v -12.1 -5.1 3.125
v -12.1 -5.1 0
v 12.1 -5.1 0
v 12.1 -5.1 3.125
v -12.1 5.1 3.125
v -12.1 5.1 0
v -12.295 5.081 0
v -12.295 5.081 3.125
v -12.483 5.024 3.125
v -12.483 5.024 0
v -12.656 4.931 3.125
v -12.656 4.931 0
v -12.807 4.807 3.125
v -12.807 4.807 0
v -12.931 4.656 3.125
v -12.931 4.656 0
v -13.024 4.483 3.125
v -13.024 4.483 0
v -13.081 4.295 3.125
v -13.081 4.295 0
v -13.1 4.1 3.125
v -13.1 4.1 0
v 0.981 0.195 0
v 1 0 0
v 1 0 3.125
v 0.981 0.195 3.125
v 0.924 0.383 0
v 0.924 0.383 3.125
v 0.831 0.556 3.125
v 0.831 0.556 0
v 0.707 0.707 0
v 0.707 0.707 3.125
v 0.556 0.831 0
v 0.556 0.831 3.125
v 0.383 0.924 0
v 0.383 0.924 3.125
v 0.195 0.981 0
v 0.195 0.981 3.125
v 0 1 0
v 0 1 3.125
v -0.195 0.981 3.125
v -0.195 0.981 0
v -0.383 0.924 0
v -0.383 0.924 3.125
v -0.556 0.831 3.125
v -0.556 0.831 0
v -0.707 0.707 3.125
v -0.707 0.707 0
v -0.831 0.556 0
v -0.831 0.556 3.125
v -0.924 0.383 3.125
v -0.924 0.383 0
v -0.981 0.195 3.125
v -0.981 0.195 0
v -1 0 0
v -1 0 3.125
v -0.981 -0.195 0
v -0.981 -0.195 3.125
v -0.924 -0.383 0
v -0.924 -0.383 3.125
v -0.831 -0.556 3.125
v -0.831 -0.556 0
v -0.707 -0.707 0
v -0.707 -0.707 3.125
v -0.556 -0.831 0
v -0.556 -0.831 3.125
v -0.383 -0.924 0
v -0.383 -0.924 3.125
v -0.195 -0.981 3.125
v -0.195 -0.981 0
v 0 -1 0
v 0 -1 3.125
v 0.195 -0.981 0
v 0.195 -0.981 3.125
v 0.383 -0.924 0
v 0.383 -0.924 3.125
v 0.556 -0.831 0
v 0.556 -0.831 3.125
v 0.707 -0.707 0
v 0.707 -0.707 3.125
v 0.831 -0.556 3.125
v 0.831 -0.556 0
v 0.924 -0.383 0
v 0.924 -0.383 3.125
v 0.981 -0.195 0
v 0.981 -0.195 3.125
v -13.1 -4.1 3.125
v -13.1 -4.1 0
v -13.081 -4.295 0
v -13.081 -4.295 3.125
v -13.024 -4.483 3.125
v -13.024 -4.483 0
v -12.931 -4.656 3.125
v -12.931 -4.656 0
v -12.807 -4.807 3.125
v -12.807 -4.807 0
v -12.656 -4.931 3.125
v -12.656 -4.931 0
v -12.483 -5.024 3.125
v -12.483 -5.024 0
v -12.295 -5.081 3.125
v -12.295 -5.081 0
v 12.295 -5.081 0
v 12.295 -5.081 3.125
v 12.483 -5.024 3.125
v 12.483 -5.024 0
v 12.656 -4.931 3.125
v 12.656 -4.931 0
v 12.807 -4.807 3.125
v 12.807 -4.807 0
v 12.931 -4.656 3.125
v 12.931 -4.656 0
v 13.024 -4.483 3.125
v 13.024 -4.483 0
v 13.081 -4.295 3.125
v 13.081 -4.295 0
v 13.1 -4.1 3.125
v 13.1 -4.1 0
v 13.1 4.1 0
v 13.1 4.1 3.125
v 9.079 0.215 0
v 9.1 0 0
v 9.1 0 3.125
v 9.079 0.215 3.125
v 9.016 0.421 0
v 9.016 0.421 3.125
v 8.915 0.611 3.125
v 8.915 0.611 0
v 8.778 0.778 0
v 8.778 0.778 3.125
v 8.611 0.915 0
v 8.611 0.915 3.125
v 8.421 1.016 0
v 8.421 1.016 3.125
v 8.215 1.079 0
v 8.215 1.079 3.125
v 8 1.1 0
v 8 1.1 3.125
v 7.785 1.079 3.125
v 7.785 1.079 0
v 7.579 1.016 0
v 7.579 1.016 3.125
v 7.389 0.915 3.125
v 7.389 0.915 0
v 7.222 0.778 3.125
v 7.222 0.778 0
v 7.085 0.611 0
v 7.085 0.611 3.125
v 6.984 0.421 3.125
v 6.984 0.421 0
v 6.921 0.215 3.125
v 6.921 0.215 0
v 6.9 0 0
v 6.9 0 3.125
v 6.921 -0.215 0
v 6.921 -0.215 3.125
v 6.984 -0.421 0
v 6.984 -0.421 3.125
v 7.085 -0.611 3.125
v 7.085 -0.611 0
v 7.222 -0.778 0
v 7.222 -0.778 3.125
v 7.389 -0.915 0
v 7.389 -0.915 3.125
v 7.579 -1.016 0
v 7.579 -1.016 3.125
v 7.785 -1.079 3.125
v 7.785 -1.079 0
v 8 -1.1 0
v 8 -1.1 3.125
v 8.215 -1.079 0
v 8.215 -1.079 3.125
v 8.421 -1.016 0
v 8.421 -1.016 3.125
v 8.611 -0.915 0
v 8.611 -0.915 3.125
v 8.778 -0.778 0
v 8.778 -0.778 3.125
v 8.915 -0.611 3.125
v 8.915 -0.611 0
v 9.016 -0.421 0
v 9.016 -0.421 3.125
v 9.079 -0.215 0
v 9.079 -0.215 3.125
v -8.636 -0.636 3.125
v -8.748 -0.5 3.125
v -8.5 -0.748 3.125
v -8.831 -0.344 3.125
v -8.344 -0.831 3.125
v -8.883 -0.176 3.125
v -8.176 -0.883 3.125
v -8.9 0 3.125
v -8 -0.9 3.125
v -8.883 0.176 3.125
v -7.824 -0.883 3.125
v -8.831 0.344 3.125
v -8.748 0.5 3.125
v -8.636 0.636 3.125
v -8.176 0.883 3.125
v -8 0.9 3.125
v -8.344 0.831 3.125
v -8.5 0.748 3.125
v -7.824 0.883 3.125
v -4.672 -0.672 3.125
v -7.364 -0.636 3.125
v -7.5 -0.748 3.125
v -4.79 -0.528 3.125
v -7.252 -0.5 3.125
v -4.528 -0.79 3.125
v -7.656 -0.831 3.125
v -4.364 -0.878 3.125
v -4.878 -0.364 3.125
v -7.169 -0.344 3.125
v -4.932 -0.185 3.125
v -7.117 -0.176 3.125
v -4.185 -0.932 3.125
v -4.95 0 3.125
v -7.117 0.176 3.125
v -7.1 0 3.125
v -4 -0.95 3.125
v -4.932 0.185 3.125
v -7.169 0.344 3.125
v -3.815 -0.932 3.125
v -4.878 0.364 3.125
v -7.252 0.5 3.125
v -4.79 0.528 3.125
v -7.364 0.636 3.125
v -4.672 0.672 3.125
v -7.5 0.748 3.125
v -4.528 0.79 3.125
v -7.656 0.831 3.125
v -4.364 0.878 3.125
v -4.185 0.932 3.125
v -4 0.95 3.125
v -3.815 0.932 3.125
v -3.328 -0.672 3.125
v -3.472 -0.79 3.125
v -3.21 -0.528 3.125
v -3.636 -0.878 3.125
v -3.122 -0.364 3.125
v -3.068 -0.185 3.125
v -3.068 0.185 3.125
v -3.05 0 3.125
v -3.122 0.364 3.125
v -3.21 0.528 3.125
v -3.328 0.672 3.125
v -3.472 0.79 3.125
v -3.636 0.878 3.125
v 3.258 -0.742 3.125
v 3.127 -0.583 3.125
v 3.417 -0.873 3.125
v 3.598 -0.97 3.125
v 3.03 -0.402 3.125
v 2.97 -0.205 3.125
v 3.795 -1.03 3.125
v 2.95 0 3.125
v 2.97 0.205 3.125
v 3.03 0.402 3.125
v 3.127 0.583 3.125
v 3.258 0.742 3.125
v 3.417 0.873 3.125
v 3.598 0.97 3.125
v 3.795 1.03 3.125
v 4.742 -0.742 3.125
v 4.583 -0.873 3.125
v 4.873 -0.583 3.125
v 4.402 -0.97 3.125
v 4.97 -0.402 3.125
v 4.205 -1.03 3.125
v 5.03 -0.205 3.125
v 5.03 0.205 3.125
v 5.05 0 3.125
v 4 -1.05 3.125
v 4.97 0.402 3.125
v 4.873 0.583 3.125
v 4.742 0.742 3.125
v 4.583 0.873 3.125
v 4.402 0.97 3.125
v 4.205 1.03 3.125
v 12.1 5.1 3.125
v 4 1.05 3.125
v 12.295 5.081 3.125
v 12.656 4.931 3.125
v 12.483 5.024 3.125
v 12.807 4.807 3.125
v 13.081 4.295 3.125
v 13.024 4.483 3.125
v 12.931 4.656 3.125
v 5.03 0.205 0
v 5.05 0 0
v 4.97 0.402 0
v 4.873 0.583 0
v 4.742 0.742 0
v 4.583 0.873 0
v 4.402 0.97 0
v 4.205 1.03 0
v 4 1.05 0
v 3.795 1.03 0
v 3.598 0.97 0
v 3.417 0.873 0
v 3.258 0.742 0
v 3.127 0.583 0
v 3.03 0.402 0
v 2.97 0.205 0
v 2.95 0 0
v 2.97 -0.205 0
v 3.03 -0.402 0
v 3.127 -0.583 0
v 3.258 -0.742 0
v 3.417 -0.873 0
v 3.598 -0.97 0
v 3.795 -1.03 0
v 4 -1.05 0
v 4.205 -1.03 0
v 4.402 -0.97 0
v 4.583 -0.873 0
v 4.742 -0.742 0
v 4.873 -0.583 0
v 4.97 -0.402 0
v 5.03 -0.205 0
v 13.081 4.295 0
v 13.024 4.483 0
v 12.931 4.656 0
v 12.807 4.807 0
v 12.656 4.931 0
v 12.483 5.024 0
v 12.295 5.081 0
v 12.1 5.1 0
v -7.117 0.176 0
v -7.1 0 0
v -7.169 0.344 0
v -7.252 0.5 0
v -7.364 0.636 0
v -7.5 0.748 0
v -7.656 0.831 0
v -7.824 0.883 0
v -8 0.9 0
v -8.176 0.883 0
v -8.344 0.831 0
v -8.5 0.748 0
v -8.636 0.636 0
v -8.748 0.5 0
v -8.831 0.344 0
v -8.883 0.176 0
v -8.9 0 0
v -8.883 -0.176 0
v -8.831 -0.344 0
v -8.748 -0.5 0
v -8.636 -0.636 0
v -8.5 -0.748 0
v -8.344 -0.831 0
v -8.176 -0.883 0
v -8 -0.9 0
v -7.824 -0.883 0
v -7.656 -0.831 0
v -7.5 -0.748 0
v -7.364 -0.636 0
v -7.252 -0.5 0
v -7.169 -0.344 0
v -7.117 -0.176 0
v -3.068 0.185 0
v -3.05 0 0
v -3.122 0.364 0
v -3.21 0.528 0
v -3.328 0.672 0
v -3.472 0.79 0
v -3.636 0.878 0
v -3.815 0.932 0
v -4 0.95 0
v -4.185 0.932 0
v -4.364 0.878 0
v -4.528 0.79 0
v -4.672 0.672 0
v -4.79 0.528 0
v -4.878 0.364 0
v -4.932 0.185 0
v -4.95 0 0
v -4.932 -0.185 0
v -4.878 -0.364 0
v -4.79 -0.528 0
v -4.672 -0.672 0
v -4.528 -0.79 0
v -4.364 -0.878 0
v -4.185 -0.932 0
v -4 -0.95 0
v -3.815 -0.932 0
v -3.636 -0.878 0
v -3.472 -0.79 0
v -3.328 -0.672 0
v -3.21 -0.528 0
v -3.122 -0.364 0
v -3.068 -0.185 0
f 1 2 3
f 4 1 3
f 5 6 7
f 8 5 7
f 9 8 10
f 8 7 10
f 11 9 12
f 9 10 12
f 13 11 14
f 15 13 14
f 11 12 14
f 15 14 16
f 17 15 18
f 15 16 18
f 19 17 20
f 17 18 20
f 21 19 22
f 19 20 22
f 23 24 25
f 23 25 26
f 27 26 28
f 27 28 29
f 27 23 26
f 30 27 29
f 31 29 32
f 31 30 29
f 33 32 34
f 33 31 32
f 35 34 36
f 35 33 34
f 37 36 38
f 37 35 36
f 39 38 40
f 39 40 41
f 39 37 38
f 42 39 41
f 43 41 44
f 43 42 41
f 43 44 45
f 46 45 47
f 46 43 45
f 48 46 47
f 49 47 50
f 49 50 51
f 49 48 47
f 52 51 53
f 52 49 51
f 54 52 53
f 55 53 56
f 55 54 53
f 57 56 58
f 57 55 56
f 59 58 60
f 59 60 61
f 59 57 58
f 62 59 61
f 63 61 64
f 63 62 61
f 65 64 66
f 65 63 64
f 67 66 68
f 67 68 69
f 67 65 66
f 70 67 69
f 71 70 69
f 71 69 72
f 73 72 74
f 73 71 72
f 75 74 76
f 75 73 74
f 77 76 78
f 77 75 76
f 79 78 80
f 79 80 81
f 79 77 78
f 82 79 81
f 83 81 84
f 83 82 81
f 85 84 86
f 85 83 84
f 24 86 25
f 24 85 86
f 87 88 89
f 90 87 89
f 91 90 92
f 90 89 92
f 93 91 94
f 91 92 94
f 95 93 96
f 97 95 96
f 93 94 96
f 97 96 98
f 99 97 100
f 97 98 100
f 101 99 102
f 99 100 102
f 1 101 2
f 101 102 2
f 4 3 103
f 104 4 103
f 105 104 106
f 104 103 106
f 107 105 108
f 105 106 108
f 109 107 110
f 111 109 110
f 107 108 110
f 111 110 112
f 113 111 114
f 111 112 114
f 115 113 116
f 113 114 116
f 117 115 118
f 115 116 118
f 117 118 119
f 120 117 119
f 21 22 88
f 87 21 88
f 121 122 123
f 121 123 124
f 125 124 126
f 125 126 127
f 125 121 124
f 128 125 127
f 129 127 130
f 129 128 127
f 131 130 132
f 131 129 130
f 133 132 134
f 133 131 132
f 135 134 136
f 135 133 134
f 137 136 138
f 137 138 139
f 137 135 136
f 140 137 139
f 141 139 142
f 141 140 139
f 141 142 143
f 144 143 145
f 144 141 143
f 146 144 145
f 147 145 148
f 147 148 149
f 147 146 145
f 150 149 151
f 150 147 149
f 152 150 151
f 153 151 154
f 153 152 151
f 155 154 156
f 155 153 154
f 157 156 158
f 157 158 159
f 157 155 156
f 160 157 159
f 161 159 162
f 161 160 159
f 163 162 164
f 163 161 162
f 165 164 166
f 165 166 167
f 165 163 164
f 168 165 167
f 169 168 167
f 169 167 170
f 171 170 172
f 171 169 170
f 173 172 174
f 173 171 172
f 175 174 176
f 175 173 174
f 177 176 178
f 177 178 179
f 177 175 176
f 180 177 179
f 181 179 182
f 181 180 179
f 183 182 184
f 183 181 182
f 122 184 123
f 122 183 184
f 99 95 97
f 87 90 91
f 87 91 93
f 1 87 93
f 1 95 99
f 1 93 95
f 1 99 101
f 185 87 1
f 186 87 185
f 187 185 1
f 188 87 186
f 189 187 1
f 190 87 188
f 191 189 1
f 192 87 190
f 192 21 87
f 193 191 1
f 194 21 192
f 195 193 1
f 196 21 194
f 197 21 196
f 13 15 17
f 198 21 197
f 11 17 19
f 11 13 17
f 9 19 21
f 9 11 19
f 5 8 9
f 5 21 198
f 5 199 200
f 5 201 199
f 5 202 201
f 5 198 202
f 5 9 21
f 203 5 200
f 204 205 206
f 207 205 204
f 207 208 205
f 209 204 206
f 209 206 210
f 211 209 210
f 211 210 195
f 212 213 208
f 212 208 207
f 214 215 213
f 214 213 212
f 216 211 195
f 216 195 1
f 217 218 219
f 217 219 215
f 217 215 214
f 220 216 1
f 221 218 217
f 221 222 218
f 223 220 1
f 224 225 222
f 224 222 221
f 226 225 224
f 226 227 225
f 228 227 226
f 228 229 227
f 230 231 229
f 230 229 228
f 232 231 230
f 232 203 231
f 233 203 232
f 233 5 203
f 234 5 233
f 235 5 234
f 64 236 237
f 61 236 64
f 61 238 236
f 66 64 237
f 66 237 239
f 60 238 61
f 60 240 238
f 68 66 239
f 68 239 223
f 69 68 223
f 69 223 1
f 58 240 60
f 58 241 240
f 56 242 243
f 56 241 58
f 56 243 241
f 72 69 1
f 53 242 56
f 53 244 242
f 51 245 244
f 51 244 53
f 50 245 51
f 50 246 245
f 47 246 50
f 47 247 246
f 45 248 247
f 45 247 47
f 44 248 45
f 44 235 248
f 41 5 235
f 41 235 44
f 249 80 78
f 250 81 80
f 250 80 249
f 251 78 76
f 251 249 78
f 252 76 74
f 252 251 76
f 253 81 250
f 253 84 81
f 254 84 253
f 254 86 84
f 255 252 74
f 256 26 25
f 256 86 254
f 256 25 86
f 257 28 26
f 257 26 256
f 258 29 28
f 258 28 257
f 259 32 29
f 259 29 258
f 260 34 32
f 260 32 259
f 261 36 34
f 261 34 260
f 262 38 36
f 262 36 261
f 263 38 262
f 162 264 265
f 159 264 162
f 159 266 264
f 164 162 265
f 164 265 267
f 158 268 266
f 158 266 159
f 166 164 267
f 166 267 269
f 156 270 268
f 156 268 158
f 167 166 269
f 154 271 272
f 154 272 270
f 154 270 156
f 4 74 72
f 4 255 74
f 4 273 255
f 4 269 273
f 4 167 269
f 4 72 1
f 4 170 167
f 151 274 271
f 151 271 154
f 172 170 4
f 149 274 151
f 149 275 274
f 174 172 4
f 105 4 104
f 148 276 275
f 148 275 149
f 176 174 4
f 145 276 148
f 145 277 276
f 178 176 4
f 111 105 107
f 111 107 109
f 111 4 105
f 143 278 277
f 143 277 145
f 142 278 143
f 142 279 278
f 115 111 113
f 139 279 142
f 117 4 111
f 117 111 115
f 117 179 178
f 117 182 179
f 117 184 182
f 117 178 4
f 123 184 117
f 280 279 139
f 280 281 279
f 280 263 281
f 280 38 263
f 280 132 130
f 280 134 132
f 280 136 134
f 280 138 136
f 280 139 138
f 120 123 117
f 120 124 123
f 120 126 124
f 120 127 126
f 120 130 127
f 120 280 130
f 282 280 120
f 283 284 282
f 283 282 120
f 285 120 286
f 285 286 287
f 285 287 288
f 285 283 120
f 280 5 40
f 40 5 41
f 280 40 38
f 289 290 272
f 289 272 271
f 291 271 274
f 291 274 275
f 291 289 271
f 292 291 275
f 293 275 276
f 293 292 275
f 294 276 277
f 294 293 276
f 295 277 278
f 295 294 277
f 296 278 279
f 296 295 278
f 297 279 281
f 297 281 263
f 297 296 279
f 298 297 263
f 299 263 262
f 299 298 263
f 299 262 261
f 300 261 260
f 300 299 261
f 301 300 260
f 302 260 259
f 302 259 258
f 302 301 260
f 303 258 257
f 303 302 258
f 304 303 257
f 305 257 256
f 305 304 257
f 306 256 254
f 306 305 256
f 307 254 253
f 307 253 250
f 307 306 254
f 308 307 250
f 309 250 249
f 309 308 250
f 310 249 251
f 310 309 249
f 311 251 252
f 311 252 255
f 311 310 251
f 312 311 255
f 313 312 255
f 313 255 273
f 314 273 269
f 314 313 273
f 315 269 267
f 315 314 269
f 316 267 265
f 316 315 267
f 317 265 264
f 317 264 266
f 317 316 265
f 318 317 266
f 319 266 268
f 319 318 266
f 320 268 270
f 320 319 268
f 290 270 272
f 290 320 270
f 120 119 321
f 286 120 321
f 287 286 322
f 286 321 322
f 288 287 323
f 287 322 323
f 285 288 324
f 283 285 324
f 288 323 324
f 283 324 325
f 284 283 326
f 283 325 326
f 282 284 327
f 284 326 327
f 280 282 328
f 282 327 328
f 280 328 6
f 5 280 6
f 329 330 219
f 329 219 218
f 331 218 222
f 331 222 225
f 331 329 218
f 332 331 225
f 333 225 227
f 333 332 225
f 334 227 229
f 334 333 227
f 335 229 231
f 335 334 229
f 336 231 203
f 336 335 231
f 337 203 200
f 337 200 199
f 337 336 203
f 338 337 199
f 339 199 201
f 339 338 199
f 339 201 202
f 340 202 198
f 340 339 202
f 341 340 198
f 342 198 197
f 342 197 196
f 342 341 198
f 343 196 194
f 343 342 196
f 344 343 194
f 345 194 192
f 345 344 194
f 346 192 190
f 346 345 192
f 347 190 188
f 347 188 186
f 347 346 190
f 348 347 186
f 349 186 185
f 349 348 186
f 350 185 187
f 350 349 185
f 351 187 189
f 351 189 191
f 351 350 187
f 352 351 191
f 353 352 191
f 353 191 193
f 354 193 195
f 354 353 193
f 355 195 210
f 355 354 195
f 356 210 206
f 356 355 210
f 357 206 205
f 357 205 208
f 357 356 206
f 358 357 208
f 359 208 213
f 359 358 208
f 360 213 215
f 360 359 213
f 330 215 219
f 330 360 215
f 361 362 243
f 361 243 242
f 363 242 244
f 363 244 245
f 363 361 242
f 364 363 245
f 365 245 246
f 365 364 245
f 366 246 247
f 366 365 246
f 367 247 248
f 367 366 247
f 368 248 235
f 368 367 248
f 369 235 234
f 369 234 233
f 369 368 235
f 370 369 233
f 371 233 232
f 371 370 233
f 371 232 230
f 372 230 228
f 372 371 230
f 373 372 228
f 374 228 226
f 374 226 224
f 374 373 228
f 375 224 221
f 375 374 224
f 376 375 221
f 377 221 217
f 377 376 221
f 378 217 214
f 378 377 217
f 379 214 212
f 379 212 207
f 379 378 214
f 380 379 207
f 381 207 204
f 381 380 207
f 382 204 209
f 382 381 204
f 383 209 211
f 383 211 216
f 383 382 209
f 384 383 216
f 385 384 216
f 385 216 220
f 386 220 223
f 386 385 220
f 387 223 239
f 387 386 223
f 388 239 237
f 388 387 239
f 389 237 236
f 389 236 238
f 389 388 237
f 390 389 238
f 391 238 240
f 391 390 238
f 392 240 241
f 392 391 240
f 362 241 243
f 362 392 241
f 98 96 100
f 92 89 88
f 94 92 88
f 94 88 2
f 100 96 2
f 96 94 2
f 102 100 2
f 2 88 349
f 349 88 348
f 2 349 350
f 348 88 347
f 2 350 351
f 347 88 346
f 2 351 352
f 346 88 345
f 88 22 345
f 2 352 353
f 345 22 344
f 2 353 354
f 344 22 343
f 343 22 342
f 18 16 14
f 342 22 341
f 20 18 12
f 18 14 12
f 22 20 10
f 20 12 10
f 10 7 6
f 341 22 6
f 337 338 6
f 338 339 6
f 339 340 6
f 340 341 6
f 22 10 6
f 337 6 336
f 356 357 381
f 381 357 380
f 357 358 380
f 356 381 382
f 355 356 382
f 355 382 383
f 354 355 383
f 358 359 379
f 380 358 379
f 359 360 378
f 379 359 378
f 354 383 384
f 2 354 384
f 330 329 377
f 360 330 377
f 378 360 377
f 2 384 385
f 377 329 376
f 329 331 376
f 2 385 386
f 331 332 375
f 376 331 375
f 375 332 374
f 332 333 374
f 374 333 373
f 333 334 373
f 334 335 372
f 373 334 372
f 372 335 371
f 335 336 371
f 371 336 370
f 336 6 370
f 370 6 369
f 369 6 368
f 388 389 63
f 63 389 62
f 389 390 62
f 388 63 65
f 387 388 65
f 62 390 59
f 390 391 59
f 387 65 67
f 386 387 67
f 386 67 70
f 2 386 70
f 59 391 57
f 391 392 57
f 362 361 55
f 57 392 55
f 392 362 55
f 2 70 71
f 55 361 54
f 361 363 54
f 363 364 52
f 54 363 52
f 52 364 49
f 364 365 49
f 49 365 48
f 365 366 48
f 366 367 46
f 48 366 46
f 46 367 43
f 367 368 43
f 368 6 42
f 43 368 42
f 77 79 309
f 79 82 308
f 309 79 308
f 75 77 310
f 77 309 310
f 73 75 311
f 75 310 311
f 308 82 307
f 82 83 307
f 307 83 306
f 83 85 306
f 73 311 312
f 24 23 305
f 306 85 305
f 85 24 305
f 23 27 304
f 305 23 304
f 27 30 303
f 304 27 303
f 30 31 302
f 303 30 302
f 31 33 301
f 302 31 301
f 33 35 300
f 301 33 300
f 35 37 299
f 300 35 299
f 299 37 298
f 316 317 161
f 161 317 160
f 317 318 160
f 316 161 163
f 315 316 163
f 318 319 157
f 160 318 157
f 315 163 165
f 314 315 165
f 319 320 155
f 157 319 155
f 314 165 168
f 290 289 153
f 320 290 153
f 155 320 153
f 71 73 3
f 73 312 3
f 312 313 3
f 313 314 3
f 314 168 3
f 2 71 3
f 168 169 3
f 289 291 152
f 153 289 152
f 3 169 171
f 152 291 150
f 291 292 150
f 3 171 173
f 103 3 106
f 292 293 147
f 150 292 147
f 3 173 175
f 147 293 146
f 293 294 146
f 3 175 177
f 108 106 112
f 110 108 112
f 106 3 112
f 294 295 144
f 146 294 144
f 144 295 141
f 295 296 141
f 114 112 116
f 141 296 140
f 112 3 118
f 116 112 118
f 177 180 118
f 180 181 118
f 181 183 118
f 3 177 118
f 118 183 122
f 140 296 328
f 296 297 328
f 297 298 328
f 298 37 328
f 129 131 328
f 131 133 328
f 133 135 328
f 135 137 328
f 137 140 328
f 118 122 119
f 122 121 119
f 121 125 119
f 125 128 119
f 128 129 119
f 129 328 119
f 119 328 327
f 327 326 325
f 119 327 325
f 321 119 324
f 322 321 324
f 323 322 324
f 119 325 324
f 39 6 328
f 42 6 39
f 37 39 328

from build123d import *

# Parameters (mm, degrees)
F0_R     = 0.9
F0_R_2   = 0.95
F0_R_3   = 1
F0_R_4   = 1.05
F0_R_5   = 1.1
F1_DEPTH = 3.125


with BuildPart() as f1:
    # F0 (on Top) → F1 (new body)
    with BuildSketch(Plane.XY):
        with BuildLine():
            Line((-12.1, -5.1), (12.1, -5.1))
            ThreePointArc((12.1, -5.1), (12.807107, -4.807107), (13.1, -4.1))
            Line((13.1, -4.1), (13.1, 4.1))
            ThreePointArc((13.1, 4.1), (12.807107, 4.807107), (12.1, 5.1))
            Line((12.1, 5.1), (-12.1, 5.1))
            ThreePointArc((-12.1, 5.1), (-12.807107, 4.807107), (-13.1, 4.1))
            Line((-13.1, 4.1), (-13.1, -4.1))
            ThreePointArc((-13.1, -4.1), (-12.807107, -4.807107), (-12.1, -5.1))
        make_face()
        with Locations((-8, 0)):
            Circle(F0_R, mode=Mode.SUBTRACT)
        with Locations((-4, 0)):
            Circle(F0_R_2, mode=Mode.SUBTRACT)
        Circle(F0_R_3, mode=Mode.SUBTRACT)
        with Locations((4, 0)):
            Circle(F0_R_4, mode=Mode.SUBTRACT)
        with Locations((8, 0)):
            Circle(F0_R_5, mode=Mode.SUBTRACT)
    extrude(amount=F1_DEPTH)


solid = f1.part
